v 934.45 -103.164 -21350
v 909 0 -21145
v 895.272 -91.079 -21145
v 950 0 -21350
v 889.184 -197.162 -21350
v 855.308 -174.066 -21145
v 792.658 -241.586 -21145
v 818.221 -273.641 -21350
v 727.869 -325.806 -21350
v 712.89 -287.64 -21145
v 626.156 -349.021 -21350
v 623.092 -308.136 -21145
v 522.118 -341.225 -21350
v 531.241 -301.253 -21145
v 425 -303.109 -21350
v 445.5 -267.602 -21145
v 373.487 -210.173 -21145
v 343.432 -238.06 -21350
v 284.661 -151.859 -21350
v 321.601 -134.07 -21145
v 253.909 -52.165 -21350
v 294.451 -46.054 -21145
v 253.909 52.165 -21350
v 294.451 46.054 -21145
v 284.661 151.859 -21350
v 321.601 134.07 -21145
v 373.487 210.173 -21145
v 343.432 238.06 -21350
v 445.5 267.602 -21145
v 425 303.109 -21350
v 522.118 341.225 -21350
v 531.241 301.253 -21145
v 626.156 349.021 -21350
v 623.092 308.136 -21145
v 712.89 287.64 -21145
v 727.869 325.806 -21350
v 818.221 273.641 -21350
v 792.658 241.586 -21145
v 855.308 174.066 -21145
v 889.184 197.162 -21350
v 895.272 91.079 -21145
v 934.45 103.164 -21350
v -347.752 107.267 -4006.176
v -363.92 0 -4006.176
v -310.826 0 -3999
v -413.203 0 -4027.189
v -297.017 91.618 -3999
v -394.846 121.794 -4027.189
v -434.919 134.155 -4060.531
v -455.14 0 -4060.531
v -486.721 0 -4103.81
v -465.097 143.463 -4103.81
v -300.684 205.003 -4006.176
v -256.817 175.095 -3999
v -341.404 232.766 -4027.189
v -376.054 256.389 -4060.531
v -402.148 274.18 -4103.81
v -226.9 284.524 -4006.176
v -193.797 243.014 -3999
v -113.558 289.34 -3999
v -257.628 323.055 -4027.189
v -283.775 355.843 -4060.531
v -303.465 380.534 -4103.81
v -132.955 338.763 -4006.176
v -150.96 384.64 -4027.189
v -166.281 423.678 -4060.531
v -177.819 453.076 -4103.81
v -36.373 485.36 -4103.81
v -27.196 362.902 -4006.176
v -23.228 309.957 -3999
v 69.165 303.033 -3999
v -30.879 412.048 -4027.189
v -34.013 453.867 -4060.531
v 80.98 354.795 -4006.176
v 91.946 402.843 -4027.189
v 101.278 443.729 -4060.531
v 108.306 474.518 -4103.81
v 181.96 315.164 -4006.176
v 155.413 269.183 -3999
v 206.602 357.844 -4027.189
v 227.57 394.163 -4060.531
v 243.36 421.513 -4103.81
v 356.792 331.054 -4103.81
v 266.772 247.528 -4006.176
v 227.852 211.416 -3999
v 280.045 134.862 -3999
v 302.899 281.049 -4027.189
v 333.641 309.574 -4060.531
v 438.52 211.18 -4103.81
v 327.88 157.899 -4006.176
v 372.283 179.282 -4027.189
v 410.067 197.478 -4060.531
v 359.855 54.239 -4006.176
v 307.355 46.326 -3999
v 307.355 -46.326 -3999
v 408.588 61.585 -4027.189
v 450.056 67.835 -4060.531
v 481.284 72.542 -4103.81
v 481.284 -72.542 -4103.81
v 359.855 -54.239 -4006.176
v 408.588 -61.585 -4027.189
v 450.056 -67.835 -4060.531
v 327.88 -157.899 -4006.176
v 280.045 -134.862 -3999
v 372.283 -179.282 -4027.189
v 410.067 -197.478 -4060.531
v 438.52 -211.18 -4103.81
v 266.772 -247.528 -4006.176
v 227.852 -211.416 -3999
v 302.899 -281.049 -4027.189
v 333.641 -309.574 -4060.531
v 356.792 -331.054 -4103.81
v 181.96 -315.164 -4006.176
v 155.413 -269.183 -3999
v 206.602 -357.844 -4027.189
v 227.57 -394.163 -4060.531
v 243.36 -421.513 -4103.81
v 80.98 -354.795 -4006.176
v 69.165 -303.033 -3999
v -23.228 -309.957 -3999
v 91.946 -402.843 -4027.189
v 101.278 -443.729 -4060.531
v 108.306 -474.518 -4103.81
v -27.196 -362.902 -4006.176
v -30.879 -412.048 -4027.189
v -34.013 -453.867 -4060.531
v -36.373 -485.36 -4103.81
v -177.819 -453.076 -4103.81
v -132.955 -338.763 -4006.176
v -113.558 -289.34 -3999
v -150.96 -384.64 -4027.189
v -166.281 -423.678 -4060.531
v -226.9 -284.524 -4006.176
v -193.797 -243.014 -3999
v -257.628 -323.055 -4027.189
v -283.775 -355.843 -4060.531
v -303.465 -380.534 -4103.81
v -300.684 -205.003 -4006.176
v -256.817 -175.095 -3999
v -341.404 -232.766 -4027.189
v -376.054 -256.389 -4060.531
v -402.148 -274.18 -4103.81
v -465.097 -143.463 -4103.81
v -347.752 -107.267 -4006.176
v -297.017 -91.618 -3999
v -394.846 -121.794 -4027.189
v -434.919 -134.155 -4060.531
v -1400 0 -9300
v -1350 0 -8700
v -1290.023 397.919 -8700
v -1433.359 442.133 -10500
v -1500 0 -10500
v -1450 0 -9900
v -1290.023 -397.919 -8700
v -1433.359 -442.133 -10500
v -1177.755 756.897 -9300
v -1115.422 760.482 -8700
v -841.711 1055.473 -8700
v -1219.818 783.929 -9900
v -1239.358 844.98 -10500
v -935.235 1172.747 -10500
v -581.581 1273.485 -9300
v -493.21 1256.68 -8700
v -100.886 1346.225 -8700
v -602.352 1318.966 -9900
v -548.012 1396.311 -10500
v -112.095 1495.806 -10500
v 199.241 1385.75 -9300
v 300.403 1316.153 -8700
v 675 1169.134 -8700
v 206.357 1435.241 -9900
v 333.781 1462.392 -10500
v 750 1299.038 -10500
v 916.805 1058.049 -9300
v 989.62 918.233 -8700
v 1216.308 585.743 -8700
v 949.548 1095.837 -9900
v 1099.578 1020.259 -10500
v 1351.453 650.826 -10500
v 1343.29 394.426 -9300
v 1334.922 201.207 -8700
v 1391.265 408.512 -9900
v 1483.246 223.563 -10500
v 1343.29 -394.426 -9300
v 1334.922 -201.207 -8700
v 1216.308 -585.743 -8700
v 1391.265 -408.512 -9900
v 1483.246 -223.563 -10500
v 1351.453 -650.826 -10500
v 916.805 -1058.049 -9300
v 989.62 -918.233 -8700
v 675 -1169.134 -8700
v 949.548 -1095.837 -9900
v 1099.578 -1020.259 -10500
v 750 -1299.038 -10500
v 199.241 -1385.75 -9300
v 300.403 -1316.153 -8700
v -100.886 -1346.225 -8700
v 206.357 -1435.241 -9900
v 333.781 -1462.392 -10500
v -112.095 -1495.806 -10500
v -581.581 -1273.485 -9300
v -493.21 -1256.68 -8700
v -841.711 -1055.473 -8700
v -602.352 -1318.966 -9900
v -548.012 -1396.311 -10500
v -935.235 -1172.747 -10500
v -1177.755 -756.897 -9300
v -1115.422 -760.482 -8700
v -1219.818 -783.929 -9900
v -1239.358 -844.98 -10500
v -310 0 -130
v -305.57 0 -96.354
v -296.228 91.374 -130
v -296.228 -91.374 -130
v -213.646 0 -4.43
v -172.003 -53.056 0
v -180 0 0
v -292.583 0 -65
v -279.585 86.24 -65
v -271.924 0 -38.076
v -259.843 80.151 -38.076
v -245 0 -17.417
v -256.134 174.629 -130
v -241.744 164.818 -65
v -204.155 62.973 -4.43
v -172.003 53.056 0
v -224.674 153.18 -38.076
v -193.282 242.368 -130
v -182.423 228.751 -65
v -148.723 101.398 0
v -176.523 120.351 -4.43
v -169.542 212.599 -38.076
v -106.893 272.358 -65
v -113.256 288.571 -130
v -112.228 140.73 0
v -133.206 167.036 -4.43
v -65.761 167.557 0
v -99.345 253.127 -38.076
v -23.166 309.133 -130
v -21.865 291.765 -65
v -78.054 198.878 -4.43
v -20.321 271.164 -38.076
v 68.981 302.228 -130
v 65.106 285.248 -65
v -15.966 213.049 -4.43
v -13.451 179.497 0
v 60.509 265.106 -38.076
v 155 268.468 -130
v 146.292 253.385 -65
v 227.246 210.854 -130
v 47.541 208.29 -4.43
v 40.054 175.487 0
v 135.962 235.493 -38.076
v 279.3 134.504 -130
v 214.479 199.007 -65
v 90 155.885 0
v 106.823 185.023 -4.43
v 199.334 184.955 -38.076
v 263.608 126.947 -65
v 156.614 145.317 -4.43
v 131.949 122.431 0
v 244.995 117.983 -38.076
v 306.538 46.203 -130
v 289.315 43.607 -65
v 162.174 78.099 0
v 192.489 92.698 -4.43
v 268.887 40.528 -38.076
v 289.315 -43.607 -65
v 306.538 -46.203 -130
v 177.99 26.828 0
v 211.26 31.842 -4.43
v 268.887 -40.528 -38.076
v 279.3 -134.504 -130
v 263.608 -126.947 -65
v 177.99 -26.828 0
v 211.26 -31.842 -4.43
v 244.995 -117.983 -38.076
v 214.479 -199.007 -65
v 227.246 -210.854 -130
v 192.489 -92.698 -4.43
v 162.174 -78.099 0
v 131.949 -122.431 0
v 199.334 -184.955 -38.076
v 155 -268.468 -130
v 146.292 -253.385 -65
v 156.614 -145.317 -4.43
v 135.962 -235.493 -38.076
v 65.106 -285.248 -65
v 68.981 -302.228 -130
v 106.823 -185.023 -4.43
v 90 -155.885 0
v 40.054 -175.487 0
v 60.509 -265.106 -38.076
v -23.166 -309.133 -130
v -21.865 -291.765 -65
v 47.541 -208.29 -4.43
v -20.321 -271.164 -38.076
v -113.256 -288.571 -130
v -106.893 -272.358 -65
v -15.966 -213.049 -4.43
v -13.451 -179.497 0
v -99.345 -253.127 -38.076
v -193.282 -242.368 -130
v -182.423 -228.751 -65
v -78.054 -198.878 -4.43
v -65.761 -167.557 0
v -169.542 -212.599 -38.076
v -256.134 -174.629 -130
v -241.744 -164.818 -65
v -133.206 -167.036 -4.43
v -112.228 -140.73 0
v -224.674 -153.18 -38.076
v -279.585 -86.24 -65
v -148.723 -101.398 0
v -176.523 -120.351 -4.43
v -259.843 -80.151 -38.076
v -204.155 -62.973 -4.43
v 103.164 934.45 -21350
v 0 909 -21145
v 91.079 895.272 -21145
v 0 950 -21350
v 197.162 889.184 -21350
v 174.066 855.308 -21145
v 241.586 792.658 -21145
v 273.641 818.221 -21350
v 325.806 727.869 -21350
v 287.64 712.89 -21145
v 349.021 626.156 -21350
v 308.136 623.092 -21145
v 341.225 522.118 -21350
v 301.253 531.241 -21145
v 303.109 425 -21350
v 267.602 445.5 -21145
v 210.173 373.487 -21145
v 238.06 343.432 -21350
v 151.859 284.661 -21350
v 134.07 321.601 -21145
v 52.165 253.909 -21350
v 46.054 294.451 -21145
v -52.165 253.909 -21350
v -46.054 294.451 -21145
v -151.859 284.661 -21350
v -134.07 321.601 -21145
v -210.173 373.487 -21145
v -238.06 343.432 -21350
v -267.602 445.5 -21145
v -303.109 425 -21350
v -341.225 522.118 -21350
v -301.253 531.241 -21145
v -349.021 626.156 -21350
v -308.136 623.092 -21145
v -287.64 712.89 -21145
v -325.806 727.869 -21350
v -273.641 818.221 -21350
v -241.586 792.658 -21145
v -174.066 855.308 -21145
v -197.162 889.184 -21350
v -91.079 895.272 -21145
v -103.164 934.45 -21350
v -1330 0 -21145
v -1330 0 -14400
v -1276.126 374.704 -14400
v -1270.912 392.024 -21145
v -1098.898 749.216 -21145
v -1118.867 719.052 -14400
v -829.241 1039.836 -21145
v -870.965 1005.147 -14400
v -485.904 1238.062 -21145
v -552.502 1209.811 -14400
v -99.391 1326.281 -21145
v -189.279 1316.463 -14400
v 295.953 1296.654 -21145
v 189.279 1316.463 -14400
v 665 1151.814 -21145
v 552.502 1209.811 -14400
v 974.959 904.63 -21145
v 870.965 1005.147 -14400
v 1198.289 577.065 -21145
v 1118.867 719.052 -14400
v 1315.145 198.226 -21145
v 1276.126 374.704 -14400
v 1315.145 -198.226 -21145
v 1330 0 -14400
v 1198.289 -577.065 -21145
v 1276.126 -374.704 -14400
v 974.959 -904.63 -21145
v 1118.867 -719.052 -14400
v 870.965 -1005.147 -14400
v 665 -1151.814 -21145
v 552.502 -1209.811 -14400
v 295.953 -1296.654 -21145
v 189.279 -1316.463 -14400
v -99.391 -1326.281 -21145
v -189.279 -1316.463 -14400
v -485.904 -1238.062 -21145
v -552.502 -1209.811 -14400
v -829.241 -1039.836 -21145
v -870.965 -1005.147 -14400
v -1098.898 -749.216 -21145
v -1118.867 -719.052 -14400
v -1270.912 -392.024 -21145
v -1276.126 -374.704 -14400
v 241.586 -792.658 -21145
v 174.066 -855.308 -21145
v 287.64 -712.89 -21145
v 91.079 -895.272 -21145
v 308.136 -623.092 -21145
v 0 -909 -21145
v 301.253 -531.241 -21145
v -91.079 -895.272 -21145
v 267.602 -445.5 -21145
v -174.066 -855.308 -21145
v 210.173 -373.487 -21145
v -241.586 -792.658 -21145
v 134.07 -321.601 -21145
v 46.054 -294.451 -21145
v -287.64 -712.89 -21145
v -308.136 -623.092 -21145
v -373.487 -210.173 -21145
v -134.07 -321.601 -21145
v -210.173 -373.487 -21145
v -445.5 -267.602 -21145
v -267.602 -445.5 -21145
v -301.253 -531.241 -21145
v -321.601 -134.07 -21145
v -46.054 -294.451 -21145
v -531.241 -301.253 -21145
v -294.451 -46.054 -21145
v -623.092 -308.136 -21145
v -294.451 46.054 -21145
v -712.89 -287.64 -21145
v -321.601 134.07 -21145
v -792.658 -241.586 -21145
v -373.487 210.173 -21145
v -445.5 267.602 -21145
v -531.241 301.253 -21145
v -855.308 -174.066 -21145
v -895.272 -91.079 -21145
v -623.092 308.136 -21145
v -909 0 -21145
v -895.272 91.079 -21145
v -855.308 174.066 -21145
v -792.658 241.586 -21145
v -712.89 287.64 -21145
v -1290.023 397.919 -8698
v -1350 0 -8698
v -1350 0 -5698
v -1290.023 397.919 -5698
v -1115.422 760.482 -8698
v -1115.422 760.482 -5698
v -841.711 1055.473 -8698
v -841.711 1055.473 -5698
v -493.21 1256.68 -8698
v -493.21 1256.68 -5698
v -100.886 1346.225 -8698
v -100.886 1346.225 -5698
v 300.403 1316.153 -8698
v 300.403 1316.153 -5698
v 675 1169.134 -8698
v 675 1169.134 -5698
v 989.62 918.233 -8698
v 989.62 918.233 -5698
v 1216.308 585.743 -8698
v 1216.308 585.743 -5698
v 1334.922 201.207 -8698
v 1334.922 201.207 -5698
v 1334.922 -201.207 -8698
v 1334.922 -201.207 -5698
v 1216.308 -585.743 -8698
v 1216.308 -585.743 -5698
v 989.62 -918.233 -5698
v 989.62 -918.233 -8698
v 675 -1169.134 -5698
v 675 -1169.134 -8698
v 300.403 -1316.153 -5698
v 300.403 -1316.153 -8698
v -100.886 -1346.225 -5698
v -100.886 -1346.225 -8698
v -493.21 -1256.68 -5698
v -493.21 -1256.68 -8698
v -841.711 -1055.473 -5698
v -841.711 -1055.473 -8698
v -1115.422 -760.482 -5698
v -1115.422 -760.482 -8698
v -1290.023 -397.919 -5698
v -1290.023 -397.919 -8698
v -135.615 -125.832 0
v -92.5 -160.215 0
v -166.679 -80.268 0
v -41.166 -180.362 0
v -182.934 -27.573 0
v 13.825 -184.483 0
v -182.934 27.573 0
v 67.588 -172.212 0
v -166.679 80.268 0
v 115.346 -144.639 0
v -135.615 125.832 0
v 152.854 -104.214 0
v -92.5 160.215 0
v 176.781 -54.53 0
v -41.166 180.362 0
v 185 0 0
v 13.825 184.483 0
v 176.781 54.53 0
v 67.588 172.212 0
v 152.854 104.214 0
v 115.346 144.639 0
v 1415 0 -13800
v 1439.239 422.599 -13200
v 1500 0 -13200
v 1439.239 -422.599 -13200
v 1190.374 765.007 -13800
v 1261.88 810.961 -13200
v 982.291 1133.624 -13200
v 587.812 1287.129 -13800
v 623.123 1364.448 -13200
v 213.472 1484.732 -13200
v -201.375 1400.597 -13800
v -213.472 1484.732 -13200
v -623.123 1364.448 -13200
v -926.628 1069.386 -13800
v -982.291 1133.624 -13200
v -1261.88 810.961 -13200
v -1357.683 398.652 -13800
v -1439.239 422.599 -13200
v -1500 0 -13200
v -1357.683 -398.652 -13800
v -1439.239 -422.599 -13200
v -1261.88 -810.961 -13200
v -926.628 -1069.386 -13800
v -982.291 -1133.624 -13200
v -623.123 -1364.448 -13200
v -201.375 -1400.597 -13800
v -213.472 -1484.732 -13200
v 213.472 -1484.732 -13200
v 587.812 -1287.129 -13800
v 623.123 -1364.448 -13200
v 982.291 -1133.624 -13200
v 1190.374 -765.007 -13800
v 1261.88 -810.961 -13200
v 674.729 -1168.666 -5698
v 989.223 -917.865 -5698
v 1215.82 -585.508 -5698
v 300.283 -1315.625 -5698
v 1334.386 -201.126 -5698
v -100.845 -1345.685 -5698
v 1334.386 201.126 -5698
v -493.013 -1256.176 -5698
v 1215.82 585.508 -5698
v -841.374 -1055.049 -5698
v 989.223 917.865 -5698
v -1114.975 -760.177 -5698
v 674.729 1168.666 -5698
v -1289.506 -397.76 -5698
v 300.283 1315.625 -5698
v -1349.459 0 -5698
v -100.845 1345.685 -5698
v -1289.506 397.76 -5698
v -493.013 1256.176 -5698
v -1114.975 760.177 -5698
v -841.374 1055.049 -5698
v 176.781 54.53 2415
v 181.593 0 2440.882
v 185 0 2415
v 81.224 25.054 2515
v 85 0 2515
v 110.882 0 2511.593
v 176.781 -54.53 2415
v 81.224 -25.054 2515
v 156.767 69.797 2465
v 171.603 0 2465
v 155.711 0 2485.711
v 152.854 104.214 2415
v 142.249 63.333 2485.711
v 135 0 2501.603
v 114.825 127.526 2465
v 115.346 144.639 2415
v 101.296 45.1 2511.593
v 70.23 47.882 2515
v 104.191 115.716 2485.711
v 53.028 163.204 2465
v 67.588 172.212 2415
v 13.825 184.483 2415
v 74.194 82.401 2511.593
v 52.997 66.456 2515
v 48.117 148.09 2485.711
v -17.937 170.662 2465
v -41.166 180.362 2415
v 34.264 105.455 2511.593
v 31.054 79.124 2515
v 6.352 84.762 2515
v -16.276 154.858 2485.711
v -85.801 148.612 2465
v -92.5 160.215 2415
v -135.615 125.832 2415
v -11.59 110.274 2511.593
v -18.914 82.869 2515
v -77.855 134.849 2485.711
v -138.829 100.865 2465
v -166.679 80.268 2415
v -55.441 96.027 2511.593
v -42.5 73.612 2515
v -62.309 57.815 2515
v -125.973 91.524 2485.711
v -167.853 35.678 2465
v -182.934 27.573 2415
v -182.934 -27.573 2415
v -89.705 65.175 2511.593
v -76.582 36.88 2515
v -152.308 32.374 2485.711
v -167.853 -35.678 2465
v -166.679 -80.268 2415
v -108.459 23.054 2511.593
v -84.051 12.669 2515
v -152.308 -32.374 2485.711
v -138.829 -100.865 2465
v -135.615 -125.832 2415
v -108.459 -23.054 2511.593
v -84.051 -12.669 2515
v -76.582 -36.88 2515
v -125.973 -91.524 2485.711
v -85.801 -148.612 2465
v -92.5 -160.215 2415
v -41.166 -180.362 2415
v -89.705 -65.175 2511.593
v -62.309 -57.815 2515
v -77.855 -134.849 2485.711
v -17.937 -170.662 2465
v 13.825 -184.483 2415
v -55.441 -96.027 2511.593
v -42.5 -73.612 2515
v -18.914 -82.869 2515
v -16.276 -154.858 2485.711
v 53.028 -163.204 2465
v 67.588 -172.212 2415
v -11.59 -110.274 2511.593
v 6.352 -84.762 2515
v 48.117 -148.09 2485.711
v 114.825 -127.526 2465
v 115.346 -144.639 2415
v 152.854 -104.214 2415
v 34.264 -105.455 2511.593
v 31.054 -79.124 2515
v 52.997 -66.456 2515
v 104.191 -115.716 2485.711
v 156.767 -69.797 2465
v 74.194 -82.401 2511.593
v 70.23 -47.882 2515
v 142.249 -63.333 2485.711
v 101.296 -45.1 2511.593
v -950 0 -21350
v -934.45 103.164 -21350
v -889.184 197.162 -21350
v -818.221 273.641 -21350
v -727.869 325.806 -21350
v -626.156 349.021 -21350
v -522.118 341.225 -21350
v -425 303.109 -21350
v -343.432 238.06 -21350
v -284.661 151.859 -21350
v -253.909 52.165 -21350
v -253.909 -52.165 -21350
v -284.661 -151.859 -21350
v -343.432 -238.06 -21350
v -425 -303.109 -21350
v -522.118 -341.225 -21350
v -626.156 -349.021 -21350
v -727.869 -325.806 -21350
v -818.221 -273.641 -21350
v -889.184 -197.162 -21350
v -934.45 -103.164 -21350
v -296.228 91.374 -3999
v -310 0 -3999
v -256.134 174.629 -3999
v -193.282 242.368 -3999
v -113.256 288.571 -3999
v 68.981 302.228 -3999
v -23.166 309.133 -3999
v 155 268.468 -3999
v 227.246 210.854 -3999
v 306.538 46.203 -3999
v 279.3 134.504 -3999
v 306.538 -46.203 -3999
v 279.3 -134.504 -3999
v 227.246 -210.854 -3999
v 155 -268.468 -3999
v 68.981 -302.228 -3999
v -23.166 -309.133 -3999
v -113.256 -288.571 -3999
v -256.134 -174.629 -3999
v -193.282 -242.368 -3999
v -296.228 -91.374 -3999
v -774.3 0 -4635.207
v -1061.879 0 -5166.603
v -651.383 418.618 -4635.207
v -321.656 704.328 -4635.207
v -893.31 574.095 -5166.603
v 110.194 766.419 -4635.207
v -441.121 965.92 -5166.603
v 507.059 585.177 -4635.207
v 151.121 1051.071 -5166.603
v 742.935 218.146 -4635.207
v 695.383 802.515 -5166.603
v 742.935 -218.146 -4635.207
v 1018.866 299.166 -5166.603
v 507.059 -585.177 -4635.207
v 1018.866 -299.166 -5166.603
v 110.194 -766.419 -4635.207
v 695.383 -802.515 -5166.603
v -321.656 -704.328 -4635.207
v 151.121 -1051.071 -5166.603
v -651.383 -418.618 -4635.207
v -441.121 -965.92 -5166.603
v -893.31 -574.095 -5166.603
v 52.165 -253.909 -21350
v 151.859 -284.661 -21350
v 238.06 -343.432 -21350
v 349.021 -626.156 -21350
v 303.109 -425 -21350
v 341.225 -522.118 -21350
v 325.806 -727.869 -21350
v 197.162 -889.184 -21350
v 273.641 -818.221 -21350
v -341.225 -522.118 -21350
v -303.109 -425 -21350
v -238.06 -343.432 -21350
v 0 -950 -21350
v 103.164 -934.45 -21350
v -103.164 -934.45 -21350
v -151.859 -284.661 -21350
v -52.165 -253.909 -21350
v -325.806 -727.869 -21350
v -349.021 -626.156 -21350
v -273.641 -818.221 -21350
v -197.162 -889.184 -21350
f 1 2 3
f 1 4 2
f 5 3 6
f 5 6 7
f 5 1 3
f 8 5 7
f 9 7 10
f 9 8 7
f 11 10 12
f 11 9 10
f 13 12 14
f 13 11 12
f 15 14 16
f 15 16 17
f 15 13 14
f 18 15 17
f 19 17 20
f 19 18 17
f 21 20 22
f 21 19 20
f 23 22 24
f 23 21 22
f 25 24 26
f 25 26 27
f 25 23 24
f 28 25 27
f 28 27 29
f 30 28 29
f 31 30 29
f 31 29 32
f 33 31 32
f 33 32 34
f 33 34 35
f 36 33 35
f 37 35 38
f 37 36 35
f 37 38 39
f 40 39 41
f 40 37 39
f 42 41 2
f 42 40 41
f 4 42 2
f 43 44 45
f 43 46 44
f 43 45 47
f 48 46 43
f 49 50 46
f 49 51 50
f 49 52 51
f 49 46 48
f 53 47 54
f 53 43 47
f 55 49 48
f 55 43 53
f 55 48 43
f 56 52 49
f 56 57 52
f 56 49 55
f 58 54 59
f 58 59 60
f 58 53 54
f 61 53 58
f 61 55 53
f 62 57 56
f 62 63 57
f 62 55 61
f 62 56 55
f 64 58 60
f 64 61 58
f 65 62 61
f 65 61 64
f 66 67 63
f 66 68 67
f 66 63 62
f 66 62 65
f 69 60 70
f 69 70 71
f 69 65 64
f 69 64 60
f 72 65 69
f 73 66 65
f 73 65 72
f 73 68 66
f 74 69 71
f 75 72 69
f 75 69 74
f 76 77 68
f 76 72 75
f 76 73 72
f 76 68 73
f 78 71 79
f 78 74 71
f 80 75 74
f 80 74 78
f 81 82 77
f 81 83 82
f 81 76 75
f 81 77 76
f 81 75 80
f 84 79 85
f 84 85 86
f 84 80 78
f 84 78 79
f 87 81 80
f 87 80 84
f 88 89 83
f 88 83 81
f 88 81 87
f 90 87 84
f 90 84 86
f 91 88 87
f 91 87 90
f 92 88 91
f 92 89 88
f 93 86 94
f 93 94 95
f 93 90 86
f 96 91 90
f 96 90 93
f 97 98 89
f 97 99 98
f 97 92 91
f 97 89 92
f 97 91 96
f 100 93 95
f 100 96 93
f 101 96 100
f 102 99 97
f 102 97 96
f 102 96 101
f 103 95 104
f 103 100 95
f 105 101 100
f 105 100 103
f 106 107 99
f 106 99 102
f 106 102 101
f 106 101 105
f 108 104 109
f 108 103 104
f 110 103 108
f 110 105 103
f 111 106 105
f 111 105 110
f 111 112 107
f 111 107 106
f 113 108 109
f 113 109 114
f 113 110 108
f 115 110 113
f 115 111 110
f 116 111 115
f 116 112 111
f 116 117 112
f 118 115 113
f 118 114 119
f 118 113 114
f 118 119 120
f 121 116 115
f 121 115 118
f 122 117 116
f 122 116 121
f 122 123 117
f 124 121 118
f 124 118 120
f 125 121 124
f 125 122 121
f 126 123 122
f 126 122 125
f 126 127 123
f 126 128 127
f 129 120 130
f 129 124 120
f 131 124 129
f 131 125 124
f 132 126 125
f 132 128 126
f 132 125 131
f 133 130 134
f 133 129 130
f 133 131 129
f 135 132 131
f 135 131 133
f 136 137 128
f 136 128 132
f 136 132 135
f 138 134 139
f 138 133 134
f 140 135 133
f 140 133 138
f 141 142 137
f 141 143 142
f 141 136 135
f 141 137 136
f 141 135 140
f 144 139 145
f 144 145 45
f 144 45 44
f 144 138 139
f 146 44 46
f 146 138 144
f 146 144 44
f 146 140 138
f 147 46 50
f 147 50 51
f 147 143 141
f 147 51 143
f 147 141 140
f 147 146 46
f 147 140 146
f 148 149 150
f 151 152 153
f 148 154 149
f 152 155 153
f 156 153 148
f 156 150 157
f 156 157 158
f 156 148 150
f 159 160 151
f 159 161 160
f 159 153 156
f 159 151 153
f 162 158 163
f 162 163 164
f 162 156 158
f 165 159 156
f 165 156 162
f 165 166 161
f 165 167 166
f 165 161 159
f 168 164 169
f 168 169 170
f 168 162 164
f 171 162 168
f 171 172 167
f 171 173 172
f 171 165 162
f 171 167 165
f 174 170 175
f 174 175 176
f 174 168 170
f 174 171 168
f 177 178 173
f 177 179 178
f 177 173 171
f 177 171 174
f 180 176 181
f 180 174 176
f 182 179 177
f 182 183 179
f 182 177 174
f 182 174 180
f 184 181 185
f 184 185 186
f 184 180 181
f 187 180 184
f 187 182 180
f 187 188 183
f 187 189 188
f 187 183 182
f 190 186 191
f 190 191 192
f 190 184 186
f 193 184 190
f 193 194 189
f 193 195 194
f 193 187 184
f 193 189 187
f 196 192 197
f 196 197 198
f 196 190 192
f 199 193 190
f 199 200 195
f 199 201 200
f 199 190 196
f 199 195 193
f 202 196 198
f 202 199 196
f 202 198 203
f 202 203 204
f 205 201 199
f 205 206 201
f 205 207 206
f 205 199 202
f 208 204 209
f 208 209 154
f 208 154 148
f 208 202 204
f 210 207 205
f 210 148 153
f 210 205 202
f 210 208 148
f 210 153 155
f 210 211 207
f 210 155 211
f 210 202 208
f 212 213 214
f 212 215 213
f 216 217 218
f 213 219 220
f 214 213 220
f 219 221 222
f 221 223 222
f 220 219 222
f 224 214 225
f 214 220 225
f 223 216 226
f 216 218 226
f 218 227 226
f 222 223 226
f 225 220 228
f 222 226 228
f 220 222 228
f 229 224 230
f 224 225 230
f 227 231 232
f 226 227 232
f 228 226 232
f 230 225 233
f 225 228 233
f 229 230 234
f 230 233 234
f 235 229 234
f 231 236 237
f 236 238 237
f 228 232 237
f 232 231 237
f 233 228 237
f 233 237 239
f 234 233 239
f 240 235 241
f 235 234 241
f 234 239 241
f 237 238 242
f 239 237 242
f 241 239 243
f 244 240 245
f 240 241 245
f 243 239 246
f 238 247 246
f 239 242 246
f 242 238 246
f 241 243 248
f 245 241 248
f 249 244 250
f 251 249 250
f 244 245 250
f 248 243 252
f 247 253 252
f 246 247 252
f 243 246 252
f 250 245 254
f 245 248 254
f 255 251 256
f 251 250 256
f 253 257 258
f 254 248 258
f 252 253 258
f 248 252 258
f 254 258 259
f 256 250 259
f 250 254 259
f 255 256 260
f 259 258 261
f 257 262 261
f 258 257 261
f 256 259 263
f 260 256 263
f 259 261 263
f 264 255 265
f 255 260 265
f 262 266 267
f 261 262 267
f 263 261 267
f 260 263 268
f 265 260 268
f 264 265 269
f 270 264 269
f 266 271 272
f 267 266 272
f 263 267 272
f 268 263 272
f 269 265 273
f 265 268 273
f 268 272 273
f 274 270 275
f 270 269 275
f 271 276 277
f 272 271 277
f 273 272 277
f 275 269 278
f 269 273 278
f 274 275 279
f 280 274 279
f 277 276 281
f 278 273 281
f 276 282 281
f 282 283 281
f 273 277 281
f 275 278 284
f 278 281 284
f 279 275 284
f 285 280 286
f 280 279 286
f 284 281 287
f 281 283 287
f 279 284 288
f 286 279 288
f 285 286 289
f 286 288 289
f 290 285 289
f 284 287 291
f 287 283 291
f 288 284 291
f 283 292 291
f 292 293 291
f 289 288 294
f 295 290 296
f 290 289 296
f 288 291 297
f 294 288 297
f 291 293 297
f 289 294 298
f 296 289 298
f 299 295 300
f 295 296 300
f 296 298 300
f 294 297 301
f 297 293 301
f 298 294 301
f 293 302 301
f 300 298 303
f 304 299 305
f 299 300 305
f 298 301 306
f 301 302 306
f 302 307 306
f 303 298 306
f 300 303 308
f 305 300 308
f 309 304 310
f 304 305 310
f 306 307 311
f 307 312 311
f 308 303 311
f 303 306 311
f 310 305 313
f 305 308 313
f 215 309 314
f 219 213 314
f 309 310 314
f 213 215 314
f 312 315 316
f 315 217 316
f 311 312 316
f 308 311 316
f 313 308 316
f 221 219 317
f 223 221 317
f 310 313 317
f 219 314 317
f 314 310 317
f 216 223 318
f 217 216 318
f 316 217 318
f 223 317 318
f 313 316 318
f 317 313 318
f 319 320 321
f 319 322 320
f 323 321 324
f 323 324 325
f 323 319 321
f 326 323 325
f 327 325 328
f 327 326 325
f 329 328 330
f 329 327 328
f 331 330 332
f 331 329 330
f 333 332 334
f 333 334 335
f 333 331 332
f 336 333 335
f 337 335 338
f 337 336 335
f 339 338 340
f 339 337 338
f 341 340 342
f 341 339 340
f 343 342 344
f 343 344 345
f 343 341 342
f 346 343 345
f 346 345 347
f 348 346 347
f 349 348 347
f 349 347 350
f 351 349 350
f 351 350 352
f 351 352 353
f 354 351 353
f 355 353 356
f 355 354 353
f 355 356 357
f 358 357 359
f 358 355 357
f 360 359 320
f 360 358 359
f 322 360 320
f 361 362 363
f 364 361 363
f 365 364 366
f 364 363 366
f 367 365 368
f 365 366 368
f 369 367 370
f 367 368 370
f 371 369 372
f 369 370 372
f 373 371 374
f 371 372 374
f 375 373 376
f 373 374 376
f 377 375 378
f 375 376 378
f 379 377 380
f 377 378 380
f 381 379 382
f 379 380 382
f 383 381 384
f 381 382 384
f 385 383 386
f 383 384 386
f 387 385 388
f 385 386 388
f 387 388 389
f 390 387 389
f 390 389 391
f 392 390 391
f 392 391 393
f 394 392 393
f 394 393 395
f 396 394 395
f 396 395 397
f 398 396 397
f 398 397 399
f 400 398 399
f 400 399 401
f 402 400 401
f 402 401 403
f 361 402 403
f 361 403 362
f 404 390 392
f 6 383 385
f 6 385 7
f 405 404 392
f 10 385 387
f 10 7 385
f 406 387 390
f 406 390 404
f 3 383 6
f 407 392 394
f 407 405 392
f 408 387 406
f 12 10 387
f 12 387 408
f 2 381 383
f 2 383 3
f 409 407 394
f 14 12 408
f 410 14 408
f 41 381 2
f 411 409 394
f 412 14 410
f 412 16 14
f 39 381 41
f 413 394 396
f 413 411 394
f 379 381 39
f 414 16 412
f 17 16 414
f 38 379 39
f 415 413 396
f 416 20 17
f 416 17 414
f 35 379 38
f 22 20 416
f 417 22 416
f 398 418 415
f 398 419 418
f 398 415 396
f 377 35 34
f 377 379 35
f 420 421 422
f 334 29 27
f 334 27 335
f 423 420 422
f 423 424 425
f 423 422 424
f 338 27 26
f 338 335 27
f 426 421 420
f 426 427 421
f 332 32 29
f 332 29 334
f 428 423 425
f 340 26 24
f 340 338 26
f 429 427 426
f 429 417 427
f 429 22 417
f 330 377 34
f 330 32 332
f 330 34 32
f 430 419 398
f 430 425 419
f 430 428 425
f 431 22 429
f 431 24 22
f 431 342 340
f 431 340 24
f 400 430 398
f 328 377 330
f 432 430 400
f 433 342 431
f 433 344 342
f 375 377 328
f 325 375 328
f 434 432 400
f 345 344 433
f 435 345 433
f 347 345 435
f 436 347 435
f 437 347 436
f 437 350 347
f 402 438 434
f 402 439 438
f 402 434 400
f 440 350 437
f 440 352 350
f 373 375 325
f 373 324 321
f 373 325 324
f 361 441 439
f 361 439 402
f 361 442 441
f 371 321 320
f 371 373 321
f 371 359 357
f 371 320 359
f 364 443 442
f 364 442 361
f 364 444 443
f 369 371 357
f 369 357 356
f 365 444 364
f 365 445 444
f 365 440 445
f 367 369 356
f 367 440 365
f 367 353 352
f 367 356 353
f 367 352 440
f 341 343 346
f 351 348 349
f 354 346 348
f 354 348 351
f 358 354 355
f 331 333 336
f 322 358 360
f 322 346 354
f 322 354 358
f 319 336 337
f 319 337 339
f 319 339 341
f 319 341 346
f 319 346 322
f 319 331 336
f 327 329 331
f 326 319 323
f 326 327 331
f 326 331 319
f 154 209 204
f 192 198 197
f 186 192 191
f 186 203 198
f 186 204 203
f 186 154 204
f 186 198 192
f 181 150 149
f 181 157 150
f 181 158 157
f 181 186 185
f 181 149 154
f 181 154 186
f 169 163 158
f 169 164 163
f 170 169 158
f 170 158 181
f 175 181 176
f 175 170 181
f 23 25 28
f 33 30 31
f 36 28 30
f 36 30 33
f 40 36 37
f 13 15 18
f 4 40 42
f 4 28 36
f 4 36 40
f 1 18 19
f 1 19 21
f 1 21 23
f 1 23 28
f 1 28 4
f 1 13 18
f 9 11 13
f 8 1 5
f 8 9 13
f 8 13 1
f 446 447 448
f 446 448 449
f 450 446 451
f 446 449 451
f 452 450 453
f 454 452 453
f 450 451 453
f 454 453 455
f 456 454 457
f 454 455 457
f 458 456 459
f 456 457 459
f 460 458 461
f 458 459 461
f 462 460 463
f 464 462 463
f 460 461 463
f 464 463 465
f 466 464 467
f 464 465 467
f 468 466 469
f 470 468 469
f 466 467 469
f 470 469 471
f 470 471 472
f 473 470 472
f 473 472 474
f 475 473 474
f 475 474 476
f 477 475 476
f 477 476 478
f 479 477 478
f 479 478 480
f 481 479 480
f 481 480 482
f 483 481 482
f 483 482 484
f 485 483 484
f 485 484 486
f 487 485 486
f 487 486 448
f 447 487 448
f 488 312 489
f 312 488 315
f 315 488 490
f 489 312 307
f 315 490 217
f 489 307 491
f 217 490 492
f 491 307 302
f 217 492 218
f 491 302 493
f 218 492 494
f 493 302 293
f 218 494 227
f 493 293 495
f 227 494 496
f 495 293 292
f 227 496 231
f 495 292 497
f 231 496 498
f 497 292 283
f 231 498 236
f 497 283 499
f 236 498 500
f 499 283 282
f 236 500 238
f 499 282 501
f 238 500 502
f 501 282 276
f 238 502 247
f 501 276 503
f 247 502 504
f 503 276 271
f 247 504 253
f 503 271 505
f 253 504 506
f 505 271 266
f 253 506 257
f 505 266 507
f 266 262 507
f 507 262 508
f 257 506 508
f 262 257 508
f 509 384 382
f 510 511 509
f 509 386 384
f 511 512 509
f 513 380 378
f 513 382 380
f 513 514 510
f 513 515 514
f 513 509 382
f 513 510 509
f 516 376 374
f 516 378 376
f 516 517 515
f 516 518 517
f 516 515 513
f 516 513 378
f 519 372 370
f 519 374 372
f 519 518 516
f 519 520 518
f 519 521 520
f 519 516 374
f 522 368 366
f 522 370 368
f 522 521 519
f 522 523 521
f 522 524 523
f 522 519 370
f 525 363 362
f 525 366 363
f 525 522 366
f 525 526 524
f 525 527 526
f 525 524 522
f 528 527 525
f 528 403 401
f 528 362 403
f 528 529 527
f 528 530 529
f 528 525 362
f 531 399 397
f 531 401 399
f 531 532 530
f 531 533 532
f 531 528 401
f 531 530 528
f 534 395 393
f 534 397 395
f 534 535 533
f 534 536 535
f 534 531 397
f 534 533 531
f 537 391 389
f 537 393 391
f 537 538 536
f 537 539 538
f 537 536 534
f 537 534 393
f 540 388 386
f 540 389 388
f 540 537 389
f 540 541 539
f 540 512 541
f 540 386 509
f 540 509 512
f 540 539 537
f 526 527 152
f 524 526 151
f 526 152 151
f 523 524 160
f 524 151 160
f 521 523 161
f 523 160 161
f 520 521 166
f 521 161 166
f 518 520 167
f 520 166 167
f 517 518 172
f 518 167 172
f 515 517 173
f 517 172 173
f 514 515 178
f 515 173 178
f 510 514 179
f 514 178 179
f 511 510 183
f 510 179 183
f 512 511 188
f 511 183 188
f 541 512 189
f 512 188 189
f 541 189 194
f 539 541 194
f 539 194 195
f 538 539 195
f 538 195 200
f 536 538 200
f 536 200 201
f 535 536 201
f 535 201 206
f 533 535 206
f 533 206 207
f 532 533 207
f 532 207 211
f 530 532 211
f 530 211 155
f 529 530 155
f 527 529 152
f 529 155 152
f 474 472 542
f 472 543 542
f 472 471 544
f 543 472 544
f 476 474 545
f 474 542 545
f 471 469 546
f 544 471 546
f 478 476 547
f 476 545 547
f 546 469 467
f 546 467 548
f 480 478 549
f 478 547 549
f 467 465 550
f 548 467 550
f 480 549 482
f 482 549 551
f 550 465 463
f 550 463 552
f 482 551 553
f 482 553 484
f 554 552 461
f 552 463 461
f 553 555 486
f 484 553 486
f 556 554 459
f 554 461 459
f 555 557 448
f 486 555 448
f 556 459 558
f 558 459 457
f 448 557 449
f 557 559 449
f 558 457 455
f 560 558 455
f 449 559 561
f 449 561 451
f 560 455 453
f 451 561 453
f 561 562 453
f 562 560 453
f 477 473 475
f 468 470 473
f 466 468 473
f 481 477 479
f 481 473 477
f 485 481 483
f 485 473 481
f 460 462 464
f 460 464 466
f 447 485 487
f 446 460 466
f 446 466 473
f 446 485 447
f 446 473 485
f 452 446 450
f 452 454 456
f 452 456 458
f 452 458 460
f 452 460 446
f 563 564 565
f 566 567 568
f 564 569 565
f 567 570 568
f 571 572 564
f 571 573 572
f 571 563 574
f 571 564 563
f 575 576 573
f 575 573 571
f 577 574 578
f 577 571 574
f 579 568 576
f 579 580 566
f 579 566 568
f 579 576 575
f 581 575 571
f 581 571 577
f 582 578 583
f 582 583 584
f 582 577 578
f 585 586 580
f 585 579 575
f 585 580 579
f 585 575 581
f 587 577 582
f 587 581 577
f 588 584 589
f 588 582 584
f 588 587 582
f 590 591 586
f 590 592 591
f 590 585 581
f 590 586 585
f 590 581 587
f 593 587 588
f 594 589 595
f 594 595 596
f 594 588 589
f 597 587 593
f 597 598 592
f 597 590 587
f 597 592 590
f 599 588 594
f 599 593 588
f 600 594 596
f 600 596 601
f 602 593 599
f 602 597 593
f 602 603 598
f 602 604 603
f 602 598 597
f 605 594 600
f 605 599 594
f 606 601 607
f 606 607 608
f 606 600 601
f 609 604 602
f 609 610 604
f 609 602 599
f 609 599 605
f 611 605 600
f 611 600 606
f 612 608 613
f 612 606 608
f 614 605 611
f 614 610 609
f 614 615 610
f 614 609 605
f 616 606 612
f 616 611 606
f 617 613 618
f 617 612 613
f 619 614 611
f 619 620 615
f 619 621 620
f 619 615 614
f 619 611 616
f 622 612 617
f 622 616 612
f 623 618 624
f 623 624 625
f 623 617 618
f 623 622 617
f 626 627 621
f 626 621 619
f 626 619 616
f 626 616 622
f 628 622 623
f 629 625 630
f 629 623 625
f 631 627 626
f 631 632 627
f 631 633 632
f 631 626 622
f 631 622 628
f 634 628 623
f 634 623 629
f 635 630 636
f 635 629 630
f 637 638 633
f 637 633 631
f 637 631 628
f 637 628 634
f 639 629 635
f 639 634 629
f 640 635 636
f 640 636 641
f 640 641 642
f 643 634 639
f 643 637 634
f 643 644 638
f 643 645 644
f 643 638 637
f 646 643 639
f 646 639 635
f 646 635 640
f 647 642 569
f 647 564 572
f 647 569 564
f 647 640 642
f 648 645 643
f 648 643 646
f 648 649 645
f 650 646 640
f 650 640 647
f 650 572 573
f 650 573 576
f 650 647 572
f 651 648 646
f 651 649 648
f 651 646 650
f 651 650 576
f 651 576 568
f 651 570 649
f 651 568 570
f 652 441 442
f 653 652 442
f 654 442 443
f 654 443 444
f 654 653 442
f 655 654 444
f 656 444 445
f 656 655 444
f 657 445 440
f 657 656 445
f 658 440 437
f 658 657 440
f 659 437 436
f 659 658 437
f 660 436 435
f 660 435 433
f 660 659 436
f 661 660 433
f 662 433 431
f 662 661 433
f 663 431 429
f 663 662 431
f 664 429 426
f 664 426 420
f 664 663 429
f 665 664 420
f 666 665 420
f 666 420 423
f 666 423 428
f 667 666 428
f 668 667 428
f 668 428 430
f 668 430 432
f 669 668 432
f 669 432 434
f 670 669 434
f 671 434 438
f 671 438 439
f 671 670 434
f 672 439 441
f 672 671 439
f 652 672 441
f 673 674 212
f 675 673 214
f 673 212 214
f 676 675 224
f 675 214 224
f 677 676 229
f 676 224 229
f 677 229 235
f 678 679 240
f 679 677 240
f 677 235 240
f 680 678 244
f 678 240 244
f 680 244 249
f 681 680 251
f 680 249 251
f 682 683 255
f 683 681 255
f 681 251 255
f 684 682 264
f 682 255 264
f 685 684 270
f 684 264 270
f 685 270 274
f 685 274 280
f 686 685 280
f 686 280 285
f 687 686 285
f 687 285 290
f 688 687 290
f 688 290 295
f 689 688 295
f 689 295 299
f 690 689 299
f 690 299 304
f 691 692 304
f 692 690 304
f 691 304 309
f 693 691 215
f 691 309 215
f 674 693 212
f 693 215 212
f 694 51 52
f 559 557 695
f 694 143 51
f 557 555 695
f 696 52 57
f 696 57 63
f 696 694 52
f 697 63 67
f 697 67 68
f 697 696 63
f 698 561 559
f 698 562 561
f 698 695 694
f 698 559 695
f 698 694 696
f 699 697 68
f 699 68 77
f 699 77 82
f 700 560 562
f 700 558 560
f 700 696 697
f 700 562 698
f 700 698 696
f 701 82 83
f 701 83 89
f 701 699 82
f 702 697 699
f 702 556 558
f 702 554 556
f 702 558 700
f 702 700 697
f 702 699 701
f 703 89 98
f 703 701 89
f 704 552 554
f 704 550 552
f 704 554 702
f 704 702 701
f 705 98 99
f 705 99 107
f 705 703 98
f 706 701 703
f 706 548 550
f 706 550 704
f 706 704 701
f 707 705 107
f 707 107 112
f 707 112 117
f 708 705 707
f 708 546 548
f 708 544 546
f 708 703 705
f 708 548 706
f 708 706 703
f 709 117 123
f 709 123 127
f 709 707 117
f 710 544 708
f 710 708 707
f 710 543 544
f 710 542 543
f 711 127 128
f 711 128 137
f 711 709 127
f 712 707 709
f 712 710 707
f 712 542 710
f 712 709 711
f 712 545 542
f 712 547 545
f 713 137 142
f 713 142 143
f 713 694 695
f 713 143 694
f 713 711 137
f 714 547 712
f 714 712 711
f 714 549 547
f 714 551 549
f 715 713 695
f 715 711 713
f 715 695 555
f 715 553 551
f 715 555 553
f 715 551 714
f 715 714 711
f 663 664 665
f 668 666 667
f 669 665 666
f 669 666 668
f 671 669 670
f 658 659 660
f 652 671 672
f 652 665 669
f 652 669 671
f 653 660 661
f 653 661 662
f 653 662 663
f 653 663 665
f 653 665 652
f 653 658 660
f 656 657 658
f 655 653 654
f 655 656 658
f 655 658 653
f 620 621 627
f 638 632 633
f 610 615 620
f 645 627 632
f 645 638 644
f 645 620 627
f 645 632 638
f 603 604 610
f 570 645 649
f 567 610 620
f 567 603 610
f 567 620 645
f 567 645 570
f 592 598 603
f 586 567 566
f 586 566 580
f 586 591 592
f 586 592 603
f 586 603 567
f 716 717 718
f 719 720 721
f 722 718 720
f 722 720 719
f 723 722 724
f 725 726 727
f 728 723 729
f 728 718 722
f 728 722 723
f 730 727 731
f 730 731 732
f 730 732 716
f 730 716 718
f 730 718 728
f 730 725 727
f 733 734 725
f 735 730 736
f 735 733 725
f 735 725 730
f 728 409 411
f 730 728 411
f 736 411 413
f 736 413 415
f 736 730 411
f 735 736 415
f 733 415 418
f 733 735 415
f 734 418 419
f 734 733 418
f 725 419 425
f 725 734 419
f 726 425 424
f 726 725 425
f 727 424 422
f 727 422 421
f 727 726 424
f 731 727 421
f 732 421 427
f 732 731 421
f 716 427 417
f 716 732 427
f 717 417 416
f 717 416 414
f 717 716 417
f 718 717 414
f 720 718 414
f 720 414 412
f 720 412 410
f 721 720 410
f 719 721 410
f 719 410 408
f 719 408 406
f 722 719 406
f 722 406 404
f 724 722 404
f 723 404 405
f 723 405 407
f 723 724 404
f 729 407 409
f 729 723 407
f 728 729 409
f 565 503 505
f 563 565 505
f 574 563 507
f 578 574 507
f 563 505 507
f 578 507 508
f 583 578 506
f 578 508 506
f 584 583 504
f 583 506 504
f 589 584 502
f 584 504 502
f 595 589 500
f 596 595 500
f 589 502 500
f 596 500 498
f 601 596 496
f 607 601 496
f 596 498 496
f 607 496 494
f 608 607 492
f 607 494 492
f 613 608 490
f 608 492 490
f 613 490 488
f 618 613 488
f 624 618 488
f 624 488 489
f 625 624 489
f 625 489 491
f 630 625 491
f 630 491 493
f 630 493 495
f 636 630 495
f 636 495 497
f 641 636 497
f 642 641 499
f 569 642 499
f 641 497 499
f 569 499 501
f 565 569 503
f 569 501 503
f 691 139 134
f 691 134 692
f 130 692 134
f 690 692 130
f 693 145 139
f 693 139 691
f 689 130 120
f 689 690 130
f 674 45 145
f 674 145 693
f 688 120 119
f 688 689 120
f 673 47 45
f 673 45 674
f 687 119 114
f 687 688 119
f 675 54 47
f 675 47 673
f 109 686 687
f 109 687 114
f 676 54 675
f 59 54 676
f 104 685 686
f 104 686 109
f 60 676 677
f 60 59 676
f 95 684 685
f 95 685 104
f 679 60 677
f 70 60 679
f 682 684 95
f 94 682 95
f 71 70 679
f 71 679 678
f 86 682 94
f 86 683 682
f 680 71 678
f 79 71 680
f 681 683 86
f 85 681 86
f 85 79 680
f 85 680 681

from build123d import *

# Parameters (mm, degrees)
CYLINDER004_R     = 1330
CYLINDER004_DEPTH = 6745
CYLINDER003_R     = 1500
CYLINDER003_DEPTH = 2700
CYLINDER002_R     = 1350
CYLINDER002_DEPTH = 3000
CYLINDER001_R     = 310
CYLINDER001_DEPTH = 4000
FILLET001_R       = 130
CYLINDER_R        = 185
CYLINDER_DEPTH    = 2515
FILLET_R          = 100
FILLET002_R       = 200
ARRAY_COUNT       = 4


with BuildPart() as cylinder004:
    # Cylinder004 → Cylinder004 (new body)
    with BuildSketch(Plane(origin=(0, 0, -14400), x_dir=(-1, 0, 0), z_dir=(0, 0, -1))):
        Circle(CYLINDER004_R)
    extrude(amount=CYLINDER004_DEPTH)


with BuildPart() as cone002:
    # Cone002 → Cone002 (revolve)
    with BuildSketch(Plane(origin=(0, 0, -14400), x_dir=(1, 0, 0), z_dir=(0, -1, 0))):
        Polygon((0, 0), (1330, 0), (1500, 1200), (0, 1200), align=None)
    revolve(axis=Axis((0, 0, -14400), (0, 0, 1)))


with BuildPart() as cylinder003:
    # Cylinder003 → Cylinder003 (new body)
    with BuildSketch(Plane(origin=(0, 0, -10500), x_dir=(-1, 0, 0), z_dir=(0, 0, -1))):
        Circle(CYLINDER003_R)
    extrude(amount=CYLINDER003_DEPTH)


with BuildPart() as cone001:
    # Cone001 → Cone001 (revolve)
    with BuildSketch(Plane(origin=(0, 0, -8700), x_dir=(-1, 0, 0), z_dir=(0, -1, 0))):
        Polygon((0, 0), (1350, 0), (1500, 1800), (0, 1800), align=None)
    revolve(axis=Axis((0, 0, -8700), (0, 0, -1)))


with BuildPart() as cylinder002:
    # Cylinder002 → Cylinder002 (new body)
    with BuildSketch(Plane(origin=(0, 0, -5698), x_dir=(-1, 0, 0), z_dir=(0, 0, -1))):
        Circle(CYLINDER002_R)
    extrude(amount=CYLINDER002_DEPTH)


with BuildPart() as fillet001:
    # Cylinder001 → Cylinder001 (new body)
    with BuildSketch(Plane(origin=(0, 0, 0), x_dir=(-1, 0, 0), z_dir=(0, 0, -1))):
        Circle(CYLINDER001_R)
    extrude(amount=CYLINDER001_DEPTH)

    # Fillet001
    fillet001_edges = [fillet001.edges().sort_by_distance(p)[0] for p in [
        (310, 0, 0),
    ]]
    fillet(fillet001_edges, radius=FILLET001_R)


with BuildPart() as cone:
    # Cone → Cone (revolve)
    with BuildSketch(Plane(origin=(0, 0, -3999), x_dir=(-1, 0, 0), z_dir=(0, -1, 0))):
        Polygon((0, 0), (430, 0), (1350, 1700), (0, 1700), align=None)
    revolve(axis=Axis((0, 0, -3999), (0, 0, -1)))


with BuildPart() as fillet002:
    # Cylinder → Cylinder (new body)
    with BuildSketch(Plane.XY):
        Circle(CYLINDER_R)
    extrude(amount=CYLINDER_DEPTH)

    # Fillet
    fillet_edges = [fillet002.edges().sort_by_distance(p)[0] for p in [
        (-185, 0, 2515),
    ]]
    fillet(fillet_edges, radius=FILLET_R)

    # Fusion: union Fillet001, Cone
    add(fillet001.part)
    add(cone.part)

    # Fillet002
    fillet002_edges = [fillet002.edges().sort_by_distance(p)[0] for p in [
        (430, 0, -3999),
    ]]
    fillet(fillet002_edges, radius=FILLET002_R)


with BuildPart() as fusion001:
    # Cone003 → Cone003 (revolve)
    with BuildSketch(Plane(origin=(-600, 0, -21100), x_dir=(-1, 0, 0), z_dir=(0, -1, 0))):
        Polygon((0, 0), (300, 0), (350, 250), (0, 250), align=None)
    revolve(axis=Axis((-600, 0, -21100), (0, 0, -1)))

    # Array: Fusion001 ×4 about axis
    array_axis = Axis((0, 0, 1), (0, 0, 1))


with BuildPart() as fusion001_1:
    add(fusion001.part)
    for i in range(1, ARRAY_COUNT):
        add(fusion001.part.rotate(array_axis, i * 360 / ARRAY_COUNT))

    # Fusion001: union Cylinder004, Cone002, Cylinder003, Cone001, Cylinder002, Fillet002
    add(cylinder004.part)
    add(cone002.part)
    add(cylinder003.part)
    add(cone001.part)
    add(cylinder002.part)
    add(fillet002.part)


solid = fusion001_1.part
